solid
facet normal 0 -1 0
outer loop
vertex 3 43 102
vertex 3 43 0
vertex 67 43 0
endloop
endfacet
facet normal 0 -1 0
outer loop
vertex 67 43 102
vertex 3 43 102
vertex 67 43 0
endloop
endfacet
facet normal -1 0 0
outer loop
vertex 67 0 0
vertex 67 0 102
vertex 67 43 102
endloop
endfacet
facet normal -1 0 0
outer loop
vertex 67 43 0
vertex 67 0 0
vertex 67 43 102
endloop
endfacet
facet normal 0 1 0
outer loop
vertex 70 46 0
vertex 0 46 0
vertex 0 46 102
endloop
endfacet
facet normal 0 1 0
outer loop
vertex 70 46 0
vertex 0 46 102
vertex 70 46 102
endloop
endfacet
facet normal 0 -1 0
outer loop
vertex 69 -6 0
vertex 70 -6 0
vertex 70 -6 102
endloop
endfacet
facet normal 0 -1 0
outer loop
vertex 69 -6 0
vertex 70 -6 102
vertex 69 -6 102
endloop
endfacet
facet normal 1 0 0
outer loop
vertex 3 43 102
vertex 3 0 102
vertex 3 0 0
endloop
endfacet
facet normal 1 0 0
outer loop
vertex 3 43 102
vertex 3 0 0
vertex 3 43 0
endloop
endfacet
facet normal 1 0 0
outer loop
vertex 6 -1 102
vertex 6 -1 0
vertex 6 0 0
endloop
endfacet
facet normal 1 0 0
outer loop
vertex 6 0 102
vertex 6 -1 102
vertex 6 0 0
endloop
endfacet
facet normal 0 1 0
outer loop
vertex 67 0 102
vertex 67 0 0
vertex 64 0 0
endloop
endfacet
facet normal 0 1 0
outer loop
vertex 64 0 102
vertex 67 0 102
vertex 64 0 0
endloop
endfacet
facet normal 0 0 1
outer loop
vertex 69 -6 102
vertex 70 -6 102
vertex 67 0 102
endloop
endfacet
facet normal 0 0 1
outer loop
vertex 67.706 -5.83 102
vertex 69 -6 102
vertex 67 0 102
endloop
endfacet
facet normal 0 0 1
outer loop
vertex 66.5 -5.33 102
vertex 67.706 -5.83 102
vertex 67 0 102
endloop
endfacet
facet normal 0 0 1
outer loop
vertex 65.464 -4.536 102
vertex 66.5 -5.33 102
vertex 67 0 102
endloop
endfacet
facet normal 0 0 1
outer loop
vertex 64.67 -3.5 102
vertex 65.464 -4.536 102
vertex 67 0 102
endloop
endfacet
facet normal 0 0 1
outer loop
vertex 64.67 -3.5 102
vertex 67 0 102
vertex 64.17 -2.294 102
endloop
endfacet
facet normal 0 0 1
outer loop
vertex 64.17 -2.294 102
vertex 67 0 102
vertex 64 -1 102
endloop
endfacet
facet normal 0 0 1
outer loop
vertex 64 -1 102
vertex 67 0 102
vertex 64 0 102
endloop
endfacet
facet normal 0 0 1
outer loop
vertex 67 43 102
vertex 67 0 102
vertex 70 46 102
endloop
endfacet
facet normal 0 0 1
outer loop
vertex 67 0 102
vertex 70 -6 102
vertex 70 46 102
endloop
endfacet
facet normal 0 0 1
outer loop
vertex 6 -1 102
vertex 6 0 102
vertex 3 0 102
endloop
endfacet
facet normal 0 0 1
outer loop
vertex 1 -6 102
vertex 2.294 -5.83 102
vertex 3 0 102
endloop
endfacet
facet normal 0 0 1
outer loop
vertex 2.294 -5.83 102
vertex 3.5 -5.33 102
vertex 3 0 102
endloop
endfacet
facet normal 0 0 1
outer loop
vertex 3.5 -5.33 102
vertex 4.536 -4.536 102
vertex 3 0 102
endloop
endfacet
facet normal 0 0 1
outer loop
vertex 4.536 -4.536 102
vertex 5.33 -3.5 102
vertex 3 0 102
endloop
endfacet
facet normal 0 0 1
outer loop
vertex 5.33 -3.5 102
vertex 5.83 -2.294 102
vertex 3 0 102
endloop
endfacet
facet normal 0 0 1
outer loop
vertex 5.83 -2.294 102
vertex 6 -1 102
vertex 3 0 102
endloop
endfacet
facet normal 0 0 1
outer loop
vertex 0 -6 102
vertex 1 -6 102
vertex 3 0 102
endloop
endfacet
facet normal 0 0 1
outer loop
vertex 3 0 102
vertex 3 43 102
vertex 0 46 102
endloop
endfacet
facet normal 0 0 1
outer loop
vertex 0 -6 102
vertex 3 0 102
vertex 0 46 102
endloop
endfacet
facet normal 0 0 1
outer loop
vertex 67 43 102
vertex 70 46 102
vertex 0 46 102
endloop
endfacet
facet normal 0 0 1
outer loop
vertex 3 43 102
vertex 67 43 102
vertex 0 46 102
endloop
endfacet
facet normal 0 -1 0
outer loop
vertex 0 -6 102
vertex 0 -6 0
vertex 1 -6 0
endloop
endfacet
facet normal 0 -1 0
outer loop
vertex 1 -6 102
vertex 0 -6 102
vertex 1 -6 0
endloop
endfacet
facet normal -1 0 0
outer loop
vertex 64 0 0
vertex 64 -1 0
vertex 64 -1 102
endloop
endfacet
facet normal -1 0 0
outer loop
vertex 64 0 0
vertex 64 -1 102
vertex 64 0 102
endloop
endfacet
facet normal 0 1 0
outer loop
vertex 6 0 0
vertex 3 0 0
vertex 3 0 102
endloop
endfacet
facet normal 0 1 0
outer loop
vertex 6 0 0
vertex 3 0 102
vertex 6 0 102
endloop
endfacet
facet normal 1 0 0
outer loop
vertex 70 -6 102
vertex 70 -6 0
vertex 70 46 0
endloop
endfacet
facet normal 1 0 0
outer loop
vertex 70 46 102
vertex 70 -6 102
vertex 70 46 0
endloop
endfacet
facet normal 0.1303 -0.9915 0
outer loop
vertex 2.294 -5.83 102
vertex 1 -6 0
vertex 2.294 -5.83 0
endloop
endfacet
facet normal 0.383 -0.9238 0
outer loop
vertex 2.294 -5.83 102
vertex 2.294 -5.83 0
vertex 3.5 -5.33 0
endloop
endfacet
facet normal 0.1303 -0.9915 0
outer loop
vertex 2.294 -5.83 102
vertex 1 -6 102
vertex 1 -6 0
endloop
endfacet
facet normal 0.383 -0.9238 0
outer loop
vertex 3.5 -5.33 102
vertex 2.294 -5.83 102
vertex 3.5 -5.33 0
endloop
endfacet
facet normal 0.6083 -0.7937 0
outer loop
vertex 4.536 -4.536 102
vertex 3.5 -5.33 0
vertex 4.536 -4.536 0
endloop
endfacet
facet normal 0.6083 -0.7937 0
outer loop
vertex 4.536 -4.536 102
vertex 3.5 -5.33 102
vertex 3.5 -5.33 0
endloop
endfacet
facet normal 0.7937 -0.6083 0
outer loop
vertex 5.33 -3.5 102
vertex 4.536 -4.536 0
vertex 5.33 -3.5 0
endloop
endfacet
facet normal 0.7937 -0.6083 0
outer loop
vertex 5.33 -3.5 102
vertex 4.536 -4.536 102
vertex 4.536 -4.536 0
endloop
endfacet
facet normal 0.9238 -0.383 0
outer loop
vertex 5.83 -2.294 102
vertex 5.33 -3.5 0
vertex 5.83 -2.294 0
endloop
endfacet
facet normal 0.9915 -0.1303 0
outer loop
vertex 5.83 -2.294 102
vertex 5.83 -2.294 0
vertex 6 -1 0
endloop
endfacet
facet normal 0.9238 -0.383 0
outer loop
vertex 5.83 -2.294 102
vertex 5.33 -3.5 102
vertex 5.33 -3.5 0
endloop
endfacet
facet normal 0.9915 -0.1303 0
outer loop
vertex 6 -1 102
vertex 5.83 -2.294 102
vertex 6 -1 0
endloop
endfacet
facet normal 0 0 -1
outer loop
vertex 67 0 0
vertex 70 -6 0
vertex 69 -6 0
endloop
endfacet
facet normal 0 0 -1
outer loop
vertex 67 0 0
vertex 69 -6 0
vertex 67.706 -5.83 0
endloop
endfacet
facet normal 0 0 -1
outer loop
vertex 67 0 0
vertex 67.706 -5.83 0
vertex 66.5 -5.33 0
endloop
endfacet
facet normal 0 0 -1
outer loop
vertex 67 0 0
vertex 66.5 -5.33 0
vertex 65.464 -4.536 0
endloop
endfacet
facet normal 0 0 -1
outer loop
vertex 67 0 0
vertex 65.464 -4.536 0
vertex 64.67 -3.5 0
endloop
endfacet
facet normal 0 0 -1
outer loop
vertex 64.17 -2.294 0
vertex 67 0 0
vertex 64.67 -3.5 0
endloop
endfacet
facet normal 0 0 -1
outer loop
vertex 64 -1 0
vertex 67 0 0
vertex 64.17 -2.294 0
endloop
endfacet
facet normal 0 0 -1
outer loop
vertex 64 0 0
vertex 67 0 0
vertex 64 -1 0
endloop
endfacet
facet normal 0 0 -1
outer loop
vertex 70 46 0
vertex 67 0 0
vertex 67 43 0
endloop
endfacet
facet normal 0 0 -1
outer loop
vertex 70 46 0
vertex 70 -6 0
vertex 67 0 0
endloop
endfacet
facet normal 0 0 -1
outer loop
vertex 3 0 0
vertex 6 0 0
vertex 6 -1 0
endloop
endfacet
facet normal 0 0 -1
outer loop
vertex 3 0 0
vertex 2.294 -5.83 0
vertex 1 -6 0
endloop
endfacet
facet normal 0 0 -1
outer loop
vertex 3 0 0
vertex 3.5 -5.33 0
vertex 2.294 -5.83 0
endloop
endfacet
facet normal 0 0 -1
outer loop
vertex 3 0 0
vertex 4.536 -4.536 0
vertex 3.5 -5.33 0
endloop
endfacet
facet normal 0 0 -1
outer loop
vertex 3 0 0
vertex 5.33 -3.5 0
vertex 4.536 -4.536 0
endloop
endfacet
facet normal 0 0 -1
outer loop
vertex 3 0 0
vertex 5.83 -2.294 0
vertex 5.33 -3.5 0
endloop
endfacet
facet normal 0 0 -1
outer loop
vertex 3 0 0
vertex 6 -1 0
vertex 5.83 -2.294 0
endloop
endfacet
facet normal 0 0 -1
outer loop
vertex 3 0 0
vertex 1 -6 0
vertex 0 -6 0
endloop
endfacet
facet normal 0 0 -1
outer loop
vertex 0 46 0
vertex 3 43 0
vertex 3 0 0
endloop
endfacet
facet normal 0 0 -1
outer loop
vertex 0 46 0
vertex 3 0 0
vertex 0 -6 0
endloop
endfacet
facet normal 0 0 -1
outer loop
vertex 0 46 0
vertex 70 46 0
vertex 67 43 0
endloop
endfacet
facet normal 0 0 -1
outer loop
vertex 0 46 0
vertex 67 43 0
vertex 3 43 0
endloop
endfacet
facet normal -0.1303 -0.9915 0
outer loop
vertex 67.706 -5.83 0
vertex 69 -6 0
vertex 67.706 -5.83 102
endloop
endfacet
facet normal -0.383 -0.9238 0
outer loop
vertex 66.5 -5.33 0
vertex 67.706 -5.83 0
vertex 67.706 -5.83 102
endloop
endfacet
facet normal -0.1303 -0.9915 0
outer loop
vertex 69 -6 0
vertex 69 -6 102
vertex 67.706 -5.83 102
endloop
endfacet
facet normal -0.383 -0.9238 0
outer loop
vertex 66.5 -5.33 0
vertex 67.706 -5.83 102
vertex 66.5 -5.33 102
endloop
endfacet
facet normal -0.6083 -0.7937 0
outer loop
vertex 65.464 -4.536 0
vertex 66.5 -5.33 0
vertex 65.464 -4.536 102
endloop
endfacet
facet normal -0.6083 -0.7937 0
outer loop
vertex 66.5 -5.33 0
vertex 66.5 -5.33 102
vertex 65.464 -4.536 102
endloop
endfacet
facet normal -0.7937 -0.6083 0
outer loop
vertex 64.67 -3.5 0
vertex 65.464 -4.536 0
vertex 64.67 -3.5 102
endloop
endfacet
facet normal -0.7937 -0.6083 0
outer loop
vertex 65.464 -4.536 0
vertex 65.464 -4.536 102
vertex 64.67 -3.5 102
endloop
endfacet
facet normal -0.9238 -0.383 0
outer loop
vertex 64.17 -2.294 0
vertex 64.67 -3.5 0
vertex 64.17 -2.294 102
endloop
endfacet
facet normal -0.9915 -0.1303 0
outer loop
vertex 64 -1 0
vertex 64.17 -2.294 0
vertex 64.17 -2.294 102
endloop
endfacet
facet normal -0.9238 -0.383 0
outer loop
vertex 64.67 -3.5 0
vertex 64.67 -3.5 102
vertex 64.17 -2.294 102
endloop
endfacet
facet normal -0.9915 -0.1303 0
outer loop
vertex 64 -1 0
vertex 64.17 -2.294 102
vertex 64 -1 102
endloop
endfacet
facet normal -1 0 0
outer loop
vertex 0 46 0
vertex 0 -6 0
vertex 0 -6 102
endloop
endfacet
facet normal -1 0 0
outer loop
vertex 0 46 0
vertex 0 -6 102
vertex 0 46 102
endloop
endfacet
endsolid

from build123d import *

# Parameters (mm, degrees)
BOX002_W     = 6
BOX002_H     = 6
BOX002_DEPTH = 102
FILLET_R     = 5
BOX001_W     = 64
BOX001_H     = 43
BOX001_DEPTH = 102
BOX_W        = 70
BOX_H        = 46
BOX_DEPTH    = 102


with BuildPart() as fillet_body:
    # Box002 → Box002 (new body)
    with BuildSketch(Plane(origin=(0, -6, 0), x_dir=(1, 0, 0), z_dir=(0, 0, 1))):
        with Locations((3, 3)):
            Rectangle(BOX002_W, BOX002_H)
    extrude(amount=BOX002_DEPTH)

    # Fillet
    fillet_edges = [fillet_body.edges().sort_by_distance(p)[0] for p in [
        (6, -6, 51),
    ]]
    fillet(fillet_edges, radius=FILLET_R)


with BuildPart() as part_mirroring:
    # Part__Mirroring: instance of Fillet body
    add(fillet_body.part.mirror(Plane(origin=(0, 0, 0), x_dir=(0, -1, 0), z_dir=(1, 0, 0))))


with BuildPart() as part_mirroring_1:
    # Part__Mirroring placement: moved
    add(part_mirroring.part.moved(Location((70, 0, 0))))


with BuildPart() as box001:
    # Box001 → Box001 (new body)
    with BuildSketch(Plane(origin=(3, 0, 0), x_dir=(1, 0, 0), z_dir=(0, 0, 1))):
        with Locations((32, 21.5)):
            Rectangle(BOX001_W, BOX001_H)
    extrude(amount=BOX001_DEPTH)


with BuildPart() as fusion:
    # Box → Box (new body)
    with BuildSketch(Plane.XY):
        with Locations((35, 23)):
            Rectangle(BOX_W, BOX_H)
    extrude(amount=BOX_DEPTH)

    # Cut: cut Box001
    add(box001.part, mode=Mode.SUBTRACT)

    # Fusion: union Fillet body, Part__Mirroring
    add(fillet_body.part)
    add(part_mirroring_1.part)


solid = fusion.part
